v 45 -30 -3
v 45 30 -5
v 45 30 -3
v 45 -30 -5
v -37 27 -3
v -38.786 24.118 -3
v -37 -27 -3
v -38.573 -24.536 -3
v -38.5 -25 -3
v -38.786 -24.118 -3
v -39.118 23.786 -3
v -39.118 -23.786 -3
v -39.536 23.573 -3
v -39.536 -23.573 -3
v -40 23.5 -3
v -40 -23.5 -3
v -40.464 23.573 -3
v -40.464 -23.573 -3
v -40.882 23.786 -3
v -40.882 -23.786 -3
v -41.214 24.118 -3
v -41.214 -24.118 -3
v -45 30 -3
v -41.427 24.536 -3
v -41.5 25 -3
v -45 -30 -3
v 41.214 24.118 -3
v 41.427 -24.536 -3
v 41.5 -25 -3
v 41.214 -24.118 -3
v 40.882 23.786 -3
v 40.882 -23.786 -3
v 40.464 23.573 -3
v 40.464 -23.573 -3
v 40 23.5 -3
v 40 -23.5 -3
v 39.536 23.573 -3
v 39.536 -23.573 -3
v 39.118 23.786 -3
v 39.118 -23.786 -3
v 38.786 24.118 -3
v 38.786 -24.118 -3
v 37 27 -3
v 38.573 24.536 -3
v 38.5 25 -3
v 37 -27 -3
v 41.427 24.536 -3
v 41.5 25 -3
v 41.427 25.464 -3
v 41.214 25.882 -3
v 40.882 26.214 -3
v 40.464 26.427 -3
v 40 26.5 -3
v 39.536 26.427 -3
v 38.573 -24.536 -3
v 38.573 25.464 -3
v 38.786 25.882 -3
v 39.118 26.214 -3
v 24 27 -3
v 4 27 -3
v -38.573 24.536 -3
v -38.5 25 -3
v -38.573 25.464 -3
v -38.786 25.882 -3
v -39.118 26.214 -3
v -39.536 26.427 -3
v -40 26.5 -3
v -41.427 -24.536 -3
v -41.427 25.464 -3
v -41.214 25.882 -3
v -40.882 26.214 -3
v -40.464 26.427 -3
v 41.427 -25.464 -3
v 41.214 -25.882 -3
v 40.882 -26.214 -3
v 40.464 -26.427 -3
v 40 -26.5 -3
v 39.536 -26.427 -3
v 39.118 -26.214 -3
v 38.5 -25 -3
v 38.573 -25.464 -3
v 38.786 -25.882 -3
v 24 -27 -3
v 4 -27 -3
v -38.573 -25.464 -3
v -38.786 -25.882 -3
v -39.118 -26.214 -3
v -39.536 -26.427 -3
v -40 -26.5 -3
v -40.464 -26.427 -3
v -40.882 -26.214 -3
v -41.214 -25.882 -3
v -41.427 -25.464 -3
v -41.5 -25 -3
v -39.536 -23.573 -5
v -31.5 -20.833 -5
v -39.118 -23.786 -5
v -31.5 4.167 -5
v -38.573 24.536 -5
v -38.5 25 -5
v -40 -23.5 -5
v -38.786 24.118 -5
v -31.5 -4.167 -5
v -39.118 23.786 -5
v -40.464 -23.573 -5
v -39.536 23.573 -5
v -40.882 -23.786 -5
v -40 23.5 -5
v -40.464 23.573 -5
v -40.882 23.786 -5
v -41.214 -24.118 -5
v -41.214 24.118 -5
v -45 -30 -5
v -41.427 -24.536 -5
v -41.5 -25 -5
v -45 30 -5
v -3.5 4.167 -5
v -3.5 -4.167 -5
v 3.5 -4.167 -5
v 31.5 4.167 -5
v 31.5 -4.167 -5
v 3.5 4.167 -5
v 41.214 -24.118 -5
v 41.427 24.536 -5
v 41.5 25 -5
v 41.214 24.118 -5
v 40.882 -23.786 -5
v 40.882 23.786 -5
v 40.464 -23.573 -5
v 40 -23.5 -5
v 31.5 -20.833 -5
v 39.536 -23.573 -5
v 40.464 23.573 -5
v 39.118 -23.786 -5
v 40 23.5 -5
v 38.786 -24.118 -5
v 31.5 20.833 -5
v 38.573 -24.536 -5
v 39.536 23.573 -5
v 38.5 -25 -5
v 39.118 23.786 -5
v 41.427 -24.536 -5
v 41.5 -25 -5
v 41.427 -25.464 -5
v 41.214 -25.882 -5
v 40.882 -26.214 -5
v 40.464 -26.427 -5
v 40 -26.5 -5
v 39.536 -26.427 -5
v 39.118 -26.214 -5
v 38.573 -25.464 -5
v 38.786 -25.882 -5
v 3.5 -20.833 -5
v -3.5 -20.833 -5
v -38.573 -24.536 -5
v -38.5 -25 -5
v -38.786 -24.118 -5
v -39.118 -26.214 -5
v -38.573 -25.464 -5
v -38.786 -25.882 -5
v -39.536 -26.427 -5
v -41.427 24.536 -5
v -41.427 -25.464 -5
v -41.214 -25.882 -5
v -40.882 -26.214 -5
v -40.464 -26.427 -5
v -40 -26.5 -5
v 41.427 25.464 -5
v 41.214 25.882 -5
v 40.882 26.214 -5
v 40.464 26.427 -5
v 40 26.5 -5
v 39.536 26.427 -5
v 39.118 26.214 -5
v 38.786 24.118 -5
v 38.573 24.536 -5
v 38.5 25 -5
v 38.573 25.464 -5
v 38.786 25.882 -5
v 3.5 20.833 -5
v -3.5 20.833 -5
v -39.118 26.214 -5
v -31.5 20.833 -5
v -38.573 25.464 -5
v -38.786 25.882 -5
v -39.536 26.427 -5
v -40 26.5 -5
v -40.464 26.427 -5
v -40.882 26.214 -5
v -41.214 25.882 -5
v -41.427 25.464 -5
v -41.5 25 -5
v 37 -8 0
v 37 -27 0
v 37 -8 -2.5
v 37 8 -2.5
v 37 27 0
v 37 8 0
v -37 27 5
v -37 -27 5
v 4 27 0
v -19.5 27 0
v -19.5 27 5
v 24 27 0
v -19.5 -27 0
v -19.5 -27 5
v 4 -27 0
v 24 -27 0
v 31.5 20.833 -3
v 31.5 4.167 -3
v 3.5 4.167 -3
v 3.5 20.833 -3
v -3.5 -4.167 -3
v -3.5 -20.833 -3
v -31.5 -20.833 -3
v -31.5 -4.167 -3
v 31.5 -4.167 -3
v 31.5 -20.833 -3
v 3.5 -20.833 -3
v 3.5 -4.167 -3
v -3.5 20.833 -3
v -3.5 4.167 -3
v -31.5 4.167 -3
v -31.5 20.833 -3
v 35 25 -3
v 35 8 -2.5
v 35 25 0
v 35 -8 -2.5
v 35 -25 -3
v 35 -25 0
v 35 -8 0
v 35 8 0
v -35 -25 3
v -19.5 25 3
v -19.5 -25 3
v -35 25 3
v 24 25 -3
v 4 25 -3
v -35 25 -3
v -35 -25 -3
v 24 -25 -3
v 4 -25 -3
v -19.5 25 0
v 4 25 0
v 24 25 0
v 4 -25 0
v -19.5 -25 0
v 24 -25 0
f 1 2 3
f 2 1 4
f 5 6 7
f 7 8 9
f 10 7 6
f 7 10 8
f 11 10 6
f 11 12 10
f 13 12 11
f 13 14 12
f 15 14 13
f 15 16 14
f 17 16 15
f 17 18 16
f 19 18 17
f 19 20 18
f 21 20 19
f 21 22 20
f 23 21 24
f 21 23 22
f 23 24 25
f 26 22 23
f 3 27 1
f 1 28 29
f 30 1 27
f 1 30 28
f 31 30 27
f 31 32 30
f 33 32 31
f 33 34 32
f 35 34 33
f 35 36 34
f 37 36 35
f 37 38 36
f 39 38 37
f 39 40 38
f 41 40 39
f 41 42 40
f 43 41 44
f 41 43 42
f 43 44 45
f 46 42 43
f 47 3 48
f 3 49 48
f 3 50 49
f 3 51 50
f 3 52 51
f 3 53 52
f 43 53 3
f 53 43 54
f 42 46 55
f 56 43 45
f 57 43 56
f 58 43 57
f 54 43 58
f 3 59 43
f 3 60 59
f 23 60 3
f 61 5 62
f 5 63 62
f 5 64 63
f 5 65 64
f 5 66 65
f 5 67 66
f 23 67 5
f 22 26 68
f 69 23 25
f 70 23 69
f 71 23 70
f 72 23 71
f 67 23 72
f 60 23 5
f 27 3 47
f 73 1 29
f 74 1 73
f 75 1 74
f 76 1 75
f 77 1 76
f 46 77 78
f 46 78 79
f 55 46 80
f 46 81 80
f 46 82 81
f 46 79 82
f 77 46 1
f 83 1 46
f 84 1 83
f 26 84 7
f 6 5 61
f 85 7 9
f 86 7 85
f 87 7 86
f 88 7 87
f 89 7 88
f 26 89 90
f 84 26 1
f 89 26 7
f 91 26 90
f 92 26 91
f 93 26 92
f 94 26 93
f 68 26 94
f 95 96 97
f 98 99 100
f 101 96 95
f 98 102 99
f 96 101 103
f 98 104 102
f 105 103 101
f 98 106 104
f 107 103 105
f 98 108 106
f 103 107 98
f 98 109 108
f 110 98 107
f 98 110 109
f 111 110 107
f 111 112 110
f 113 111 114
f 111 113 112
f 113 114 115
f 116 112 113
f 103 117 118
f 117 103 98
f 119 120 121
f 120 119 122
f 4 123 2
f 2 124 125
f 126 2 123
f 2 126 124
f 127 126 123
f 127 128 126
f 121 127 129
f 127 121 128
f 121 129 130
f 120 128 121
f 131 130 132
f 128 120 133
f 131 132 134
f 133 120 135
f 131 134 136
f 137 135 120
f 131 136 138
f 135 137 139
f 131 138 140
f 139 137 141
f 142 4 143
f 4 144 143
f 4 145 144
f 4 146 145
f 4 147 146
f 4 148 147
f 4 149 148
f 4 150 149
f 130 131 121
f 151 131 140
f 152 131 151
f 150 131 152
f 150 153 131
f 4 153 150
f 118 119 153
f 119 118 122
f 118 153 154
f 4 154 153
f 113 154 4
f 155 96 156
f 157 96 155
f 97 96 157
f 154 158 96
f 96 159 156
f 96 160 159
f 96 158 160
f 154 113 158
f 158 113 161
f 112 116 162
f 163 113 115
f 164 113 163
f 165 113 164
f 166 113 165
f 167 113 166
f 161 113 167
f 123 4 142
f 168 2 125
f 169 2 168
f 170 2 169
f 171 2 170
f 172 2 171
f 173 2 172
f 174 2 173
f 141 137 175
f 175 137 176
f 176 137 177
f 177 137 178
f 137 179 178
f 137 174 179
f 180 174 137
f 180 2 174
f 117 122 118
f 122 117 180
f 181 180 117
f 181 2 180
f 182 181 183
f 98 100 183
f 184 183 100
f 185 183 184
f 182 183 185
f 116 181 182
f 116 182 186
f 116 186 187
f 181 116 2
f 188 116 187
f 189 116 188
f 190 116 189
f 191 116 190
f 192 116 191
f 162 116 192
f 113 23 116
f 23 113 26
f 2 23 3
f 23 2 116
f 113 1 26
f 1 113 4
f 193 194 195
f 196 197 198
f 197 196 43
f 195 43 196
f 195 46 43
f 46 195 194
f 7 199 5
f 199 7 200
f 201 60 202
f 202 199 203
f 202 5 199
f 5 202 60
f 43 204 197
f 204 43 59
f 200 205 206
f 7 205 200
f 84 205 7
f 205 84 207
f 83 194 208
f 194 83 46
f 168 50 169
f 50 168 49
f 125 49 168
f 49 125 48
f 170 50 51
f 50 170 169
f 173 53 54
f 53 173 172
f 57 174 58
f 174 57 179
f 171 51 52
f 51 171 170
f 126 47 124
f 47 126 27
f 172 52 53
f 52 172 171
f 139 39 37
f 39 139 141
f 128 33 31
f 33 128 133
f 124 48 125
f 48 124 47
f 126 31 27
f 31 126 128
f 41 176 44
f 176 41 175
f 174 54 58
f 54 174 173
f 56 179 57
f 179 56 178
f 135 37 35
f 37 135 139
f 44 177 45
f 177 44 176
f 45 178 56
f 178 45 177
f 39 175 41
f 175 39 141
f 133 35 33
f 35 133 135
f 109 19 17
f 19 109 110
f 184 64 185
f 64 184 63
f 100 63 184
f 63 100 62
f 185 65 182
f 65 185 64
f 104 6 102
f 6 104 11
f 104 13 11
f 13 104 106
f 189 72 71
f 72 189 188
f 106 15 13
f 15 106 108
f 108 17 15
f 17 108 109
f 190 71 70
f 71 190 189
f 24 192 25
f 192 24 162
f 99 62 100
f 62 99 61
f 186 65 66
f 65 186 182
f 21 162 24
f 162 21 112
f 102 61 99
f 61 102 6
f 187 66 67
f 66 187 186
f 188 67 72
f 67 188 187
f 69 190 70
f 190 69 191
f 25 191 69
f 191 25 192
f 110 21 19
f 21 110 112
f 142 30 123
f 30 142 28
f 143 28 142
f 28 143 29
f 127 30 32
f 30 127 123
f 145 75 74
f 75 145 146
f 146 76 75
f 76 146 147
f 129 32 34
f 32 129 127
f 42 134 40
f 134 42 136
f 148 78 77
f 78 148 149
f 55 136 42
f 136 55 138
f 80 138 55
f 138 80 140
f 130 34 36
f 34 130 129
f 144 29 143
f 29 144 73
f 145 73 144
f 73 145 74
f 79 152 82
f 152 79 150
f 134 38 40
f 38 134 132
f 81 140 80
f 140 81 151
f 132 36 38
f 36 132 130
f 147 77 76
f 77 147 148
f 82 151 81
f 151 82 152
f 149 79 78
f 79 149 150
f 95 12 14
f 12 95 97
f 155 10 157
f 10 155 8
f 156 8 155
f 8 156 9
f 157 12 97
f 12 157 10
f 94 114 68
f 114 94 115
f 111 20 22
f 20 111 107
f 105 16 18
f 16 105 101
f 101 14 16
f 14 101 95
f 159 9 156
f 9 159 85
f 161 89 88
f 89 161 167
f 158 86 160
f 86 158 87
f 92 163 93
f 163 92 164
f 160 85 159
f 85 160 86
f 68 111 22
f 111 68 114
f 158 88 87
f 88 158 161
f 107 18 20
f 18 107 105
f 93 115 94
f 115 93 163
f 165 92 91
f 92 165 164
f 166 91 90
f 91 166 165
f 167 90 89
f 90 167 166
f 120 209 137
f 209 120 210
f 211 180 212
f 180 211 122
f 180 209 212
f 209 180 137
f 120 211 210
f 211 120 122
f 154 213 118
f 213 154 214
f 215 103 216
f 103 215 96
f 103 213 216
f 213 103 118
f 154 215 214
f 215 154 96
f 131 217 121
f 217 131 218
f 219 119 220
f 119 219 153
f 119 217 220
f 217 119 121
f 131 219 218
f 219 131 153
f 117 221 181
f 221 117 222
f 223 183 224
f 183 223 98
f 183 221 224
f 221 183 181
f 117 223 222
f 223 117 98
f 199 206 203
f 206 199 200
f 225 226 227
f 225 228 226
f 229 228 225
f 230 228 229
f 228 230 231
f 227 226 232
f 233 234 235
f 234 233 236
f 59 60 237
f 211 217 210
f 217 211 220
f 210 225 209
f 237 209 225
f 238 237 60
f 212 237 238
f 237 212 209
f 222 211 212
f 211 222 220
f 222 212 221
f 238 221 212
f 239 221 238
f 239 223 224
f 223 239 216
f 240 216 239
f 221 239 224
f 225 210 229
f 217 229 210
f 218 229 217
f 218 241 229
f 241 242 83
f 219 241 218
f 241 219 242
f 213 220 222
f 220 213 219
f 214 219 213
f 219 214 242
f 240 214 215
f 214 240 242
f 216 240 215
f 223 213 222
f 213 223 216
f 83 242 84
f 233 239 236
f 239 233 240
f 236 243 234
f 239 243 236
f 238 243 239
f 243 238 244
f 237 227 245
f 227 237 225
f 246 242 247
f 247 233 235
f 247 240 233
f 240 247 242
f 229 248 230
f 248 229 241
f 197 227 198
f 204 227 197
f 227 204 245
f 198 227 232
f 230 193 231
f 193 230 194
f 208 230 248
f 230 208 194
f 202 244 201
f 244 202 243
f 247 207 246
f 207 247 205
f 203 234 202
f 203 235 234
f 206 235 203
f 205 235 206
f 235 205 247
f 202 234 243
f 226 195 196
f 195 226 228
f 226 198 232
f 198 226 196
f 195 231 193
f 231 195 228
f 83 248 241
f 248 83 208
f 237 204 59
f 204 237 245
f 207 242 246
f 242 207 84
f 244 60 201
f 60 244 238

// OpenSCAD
battery_length=70;
battery_height=6;
battery_width=50;
// high is not be tested it can be it will not fit in!
wall_height=2; // [3:low,2:medium,1.5:!high!]
thickness=2; // [1:3]
hole= 3; // [0:8]
sunk_screws=0; // [0:NO, 1:YES]
light=1; // [0:NO, 1:YES]
band_hole=1; // [0:NO, 1:YES]
thick_edge=0; // [0:NO, 1:YES]
//If you don't need it set to 0
mount_basis_length= 90;
//If you don't need it set to 0
mount_basis_width= 60;
mount_basis_thickness= 2; // [1:3]
//mount_basis_length need to be higher than
mb_hole_distance_length= 80;
//mount_basis_width need to be higher than
mb_hole_distance_width= 50;


module Akku(){
cube([battery_length,battery_width,battery_height],center=true);
}


module Case(L,B,H)
{
    difference(){
        cube([L,B,H],center=true);
        Akku();


        if(battery_length > 100)
        {
        translate([25,0,thickness+battery_height/wall_height]){
        cube([L,B+0.5,H],center=true);
        }
        } else {
        translate([battery_length/4,0,thickness+battery_height/wall_height]){
        cube([L,B+0.5,H],center=true);
        }
        }

        if(light==1)
        {
        translate([-L/2,0,0])
        {
        cube([L,battery_width-thickness*4,battery_height-thickness*4],center=true);
        }
        }



        translate([L/2,battery_width/2-thickness*12.5,-1])
        {
        cube([L,thickness*8,battery_height-thickness*1.5],center=true);
        }
//        translate([L/2,-battery_width/2+thickness*1.5,0])
//        {
//        cube([L,thickness*3,battery_height-thickness*2],center=true);
//        }



        if(thick_edge==1)
        {
        if(battery_length/5 > 20)
        {
        translate([battery_length,battery_width/2,0])
        {
        cube([battery_length+20,thickness*3,battery_height-thickness*2],center=true);
        }
        translate([battery_length,-battery_width/2,0])
        {
        cube([battery_length+20,thickness*3,battery_height-thickness*2],center=true);
        }
        } else{
        translate([battery_length,battery_width/2,0])
        {
        cube([battery_length+battery_length/5,thickness*3,battery_height-thickness*2],center=true);
        }
        translate([battery_length,-battery_width/2,0])
        {
        cube([battery_length+battery_length/5,thickness*3,battery_height-thickness*2],center=true);
        }
        }
        }



        if(band_hole==1)
        {
        translate([battery_length/5,0,-battery_height/2+1.5])
        {
        if(battery_length > 60)
        {
        cube([20,battery_width+thickness*2+1,3],center=true);
        } else {
        cube([battery_length/3,battery_width+thickness*2+1,3],center=true);
        }
        }
        }




        if(light==1&&mb_hole_distance_length>battery_length+thickness*2||light==1&&mb_hole_distance_width>battery_width+thickness*2)
        {
    translate([battery_length/4,battery_width/4,-battery_height/2-0.1])
    {
    cube([battery_length/2.5,battery_width/3,thickness*2],center=true);
    }
    translate([-battery_length/4,-battery_width/4,-battery_height/2-0.1])
    {
    cube([battery_length/2.5,battery_width/3,thickness*2],center=true);
    }
    translate([battery_length/4,-battery_width/4,-battery_height/2-0.1])
    {
    cube([battery_length/2.5,battery_width/3,thickness*2],center=true);
    }
    translate([-battery_length/4,battery_width/4,-battery_height/2-0.1])
    {
    cube([battery_length/2.5,battery_width/3,thickness*2],center=true);
    }
    }else{
    translate([mb_hole_distance_length/2,mb_hole_distance_width/2,(-battery_height-thickness*2)/2+mount_basis_thickness/2])
    {
    cylinder(d=hole,h=mount_basis_thickness*2,$fn=20,center=true);
    }
    translate([-mb_hole_distance_length/2,mb_hole_distance_width/2,(-battery_height-thickness*2)/2+mount_basis_thickness/2])
    {
    cylinder(d=hole,h=mount_basis_thickness*2,$fn=20,center=true);
    }
    translate([mb_hole_distance_length/2,-mb_hole_distance_width/2,(-battery_height-thickness*2)/2+mount_basis_thickness/2])
    {
    cylinder(d=hole,h=mount_basis_thickness*2,$fn=20,center=true);
    }
    translate([-mb_hole_distance_length/2,-mb_hole_distance_width/2,(-battery_height-thickness*2)/2+mount_basis_thickness/2])
    {
    cylinder(d=hole,h=mount_basis_thickness*2,$fn=20,center=true);
    }
    if(sunk_screws==1)
    {
    translate([mb_hole_distance_length/2,mb_hole_distance_width/2,(-battery_height-thickness*2)/2+mount_basis_thickness-hole/4])
    {
    cylinder(d1=hole,d2=hole*2,h=hole/2,$fn=20,center=true);
    }
    translate([-mb_hole_distance_length/2,mb_hole_distance_width/2,(-battery_height-thickness*2)/2+mount_basis_thickness-hole/4])
    {
    cylinder(d1=hole,d2=hole*2,h=hole/2,$fn=20,center=true);
    }
    translate([mb_hole_distance_length/2,-mb_hole_distance_width/2,(-battery_height-thickness*2)/2+mount_basis_thickness-hole/4])
    {
    cylinder(d1=hole,d2=hole*2,h=hole/2,$fn=20,center=true);
    }
    translate([-mb_hole_distance_length/2,-mb_hole_distance_width/2,(-battery_height-thickness*2)/2+mount_basis_thickness-hole/4])
    {
    cylinder(d1=hole,d2=hole*2,h=hole/2,$fn=20,center=true);
    }
    }    
    }   
    }
}






difference(){
    translate([0,0,(-battery_height-thickness*2)/2+mount_basis_thickness/2])
    {
    cube([mount_basis_length,mount_basis_width,mount_basis_thickness],center=true);
    }
    translate([0,0,(-battery_height-thickness*2)/2+mount_basis_thickness/2])
    {
    cube([battery_length+thickness*2,battery_width+thickness*2,battery_height+thickness*2],center=true);
    }



    translate([mb_hole_distance_length/2,mb_hole_distance_width/2,(-battery_height-thickness*2)/2+mount_basis_thickness/2])
    {
    cylinder(d=hole,h=mount_basis_thickness*2,$fn=20,center=true);
    }
    translate([-mb_hole_distance_length/2,mb_hole_distance_width/2,(-battery_height-thickness*2)/2+mount_basis_thickness/2])
    {
    cylinder(d=hole,h=mount_basis_thickness*2,$fn=20,center=true);
    }
    translate([mb_hole_distance_length/2,-mb_hole_distance_width/2,(-battery_height-thickness*2)/2+mount_basis_thickness/2])
    {
    cylinder(d=hole,h=mount_basis_thickness*2,$fn=20,center=true);
    }
    translate([-mb_hole_distance_length/2,-mb_hole_distance_width/2,(-battery_height-thickness*2)/2+mount_basis_thickness/2])
    {
    cylinder(d=hole,h=mount_basis_thickness*2,$fn=20,center=true);
    }





    if(sunk_screws==1)
    {
    translate([mb_hole_distance_length/2,mb_hole_distance_width/2,(-battery_height-thickness*2)/2+mount_basis_thickness-hole/4])
    {
    cylinder(d1=hole,d2=hole*2,h=hole/2,$fn=20,center=true);
    }
    translate([-mb_hole_distance_length/2,mb_hole_distance_width/2,(-battery_height-thickness*2)/2+mount_basis_thickness-hole/4])
    {
    cylinder(d1=hole,d2=hole*2,h=hole/2,$fn=20,center=true);
    }
    translate([mb_hole_distance_length/2,-mb_hole_distance_width/2,(-battery_height-thickness*2)/2+mount_basis_thickness-hole/4])
    {
    cylinder(d1=hole,d2=hole*2,h=hole/2,$fn=20,center=true);
    }
    translate([-mb_hole_distance_length/2,-mb_hole_distance_width/2,(-battery_height-thickness*2)/2+mount_basis_thickness-hole/4])
    {
    cylinder(d1=hole,d2=hole*2,h=hole/2,$fn=20,center=true);
    }
    }
}




Case(battery_length+thickness*2,battery_width+thickness*2,battery_height+thickness*2); 
